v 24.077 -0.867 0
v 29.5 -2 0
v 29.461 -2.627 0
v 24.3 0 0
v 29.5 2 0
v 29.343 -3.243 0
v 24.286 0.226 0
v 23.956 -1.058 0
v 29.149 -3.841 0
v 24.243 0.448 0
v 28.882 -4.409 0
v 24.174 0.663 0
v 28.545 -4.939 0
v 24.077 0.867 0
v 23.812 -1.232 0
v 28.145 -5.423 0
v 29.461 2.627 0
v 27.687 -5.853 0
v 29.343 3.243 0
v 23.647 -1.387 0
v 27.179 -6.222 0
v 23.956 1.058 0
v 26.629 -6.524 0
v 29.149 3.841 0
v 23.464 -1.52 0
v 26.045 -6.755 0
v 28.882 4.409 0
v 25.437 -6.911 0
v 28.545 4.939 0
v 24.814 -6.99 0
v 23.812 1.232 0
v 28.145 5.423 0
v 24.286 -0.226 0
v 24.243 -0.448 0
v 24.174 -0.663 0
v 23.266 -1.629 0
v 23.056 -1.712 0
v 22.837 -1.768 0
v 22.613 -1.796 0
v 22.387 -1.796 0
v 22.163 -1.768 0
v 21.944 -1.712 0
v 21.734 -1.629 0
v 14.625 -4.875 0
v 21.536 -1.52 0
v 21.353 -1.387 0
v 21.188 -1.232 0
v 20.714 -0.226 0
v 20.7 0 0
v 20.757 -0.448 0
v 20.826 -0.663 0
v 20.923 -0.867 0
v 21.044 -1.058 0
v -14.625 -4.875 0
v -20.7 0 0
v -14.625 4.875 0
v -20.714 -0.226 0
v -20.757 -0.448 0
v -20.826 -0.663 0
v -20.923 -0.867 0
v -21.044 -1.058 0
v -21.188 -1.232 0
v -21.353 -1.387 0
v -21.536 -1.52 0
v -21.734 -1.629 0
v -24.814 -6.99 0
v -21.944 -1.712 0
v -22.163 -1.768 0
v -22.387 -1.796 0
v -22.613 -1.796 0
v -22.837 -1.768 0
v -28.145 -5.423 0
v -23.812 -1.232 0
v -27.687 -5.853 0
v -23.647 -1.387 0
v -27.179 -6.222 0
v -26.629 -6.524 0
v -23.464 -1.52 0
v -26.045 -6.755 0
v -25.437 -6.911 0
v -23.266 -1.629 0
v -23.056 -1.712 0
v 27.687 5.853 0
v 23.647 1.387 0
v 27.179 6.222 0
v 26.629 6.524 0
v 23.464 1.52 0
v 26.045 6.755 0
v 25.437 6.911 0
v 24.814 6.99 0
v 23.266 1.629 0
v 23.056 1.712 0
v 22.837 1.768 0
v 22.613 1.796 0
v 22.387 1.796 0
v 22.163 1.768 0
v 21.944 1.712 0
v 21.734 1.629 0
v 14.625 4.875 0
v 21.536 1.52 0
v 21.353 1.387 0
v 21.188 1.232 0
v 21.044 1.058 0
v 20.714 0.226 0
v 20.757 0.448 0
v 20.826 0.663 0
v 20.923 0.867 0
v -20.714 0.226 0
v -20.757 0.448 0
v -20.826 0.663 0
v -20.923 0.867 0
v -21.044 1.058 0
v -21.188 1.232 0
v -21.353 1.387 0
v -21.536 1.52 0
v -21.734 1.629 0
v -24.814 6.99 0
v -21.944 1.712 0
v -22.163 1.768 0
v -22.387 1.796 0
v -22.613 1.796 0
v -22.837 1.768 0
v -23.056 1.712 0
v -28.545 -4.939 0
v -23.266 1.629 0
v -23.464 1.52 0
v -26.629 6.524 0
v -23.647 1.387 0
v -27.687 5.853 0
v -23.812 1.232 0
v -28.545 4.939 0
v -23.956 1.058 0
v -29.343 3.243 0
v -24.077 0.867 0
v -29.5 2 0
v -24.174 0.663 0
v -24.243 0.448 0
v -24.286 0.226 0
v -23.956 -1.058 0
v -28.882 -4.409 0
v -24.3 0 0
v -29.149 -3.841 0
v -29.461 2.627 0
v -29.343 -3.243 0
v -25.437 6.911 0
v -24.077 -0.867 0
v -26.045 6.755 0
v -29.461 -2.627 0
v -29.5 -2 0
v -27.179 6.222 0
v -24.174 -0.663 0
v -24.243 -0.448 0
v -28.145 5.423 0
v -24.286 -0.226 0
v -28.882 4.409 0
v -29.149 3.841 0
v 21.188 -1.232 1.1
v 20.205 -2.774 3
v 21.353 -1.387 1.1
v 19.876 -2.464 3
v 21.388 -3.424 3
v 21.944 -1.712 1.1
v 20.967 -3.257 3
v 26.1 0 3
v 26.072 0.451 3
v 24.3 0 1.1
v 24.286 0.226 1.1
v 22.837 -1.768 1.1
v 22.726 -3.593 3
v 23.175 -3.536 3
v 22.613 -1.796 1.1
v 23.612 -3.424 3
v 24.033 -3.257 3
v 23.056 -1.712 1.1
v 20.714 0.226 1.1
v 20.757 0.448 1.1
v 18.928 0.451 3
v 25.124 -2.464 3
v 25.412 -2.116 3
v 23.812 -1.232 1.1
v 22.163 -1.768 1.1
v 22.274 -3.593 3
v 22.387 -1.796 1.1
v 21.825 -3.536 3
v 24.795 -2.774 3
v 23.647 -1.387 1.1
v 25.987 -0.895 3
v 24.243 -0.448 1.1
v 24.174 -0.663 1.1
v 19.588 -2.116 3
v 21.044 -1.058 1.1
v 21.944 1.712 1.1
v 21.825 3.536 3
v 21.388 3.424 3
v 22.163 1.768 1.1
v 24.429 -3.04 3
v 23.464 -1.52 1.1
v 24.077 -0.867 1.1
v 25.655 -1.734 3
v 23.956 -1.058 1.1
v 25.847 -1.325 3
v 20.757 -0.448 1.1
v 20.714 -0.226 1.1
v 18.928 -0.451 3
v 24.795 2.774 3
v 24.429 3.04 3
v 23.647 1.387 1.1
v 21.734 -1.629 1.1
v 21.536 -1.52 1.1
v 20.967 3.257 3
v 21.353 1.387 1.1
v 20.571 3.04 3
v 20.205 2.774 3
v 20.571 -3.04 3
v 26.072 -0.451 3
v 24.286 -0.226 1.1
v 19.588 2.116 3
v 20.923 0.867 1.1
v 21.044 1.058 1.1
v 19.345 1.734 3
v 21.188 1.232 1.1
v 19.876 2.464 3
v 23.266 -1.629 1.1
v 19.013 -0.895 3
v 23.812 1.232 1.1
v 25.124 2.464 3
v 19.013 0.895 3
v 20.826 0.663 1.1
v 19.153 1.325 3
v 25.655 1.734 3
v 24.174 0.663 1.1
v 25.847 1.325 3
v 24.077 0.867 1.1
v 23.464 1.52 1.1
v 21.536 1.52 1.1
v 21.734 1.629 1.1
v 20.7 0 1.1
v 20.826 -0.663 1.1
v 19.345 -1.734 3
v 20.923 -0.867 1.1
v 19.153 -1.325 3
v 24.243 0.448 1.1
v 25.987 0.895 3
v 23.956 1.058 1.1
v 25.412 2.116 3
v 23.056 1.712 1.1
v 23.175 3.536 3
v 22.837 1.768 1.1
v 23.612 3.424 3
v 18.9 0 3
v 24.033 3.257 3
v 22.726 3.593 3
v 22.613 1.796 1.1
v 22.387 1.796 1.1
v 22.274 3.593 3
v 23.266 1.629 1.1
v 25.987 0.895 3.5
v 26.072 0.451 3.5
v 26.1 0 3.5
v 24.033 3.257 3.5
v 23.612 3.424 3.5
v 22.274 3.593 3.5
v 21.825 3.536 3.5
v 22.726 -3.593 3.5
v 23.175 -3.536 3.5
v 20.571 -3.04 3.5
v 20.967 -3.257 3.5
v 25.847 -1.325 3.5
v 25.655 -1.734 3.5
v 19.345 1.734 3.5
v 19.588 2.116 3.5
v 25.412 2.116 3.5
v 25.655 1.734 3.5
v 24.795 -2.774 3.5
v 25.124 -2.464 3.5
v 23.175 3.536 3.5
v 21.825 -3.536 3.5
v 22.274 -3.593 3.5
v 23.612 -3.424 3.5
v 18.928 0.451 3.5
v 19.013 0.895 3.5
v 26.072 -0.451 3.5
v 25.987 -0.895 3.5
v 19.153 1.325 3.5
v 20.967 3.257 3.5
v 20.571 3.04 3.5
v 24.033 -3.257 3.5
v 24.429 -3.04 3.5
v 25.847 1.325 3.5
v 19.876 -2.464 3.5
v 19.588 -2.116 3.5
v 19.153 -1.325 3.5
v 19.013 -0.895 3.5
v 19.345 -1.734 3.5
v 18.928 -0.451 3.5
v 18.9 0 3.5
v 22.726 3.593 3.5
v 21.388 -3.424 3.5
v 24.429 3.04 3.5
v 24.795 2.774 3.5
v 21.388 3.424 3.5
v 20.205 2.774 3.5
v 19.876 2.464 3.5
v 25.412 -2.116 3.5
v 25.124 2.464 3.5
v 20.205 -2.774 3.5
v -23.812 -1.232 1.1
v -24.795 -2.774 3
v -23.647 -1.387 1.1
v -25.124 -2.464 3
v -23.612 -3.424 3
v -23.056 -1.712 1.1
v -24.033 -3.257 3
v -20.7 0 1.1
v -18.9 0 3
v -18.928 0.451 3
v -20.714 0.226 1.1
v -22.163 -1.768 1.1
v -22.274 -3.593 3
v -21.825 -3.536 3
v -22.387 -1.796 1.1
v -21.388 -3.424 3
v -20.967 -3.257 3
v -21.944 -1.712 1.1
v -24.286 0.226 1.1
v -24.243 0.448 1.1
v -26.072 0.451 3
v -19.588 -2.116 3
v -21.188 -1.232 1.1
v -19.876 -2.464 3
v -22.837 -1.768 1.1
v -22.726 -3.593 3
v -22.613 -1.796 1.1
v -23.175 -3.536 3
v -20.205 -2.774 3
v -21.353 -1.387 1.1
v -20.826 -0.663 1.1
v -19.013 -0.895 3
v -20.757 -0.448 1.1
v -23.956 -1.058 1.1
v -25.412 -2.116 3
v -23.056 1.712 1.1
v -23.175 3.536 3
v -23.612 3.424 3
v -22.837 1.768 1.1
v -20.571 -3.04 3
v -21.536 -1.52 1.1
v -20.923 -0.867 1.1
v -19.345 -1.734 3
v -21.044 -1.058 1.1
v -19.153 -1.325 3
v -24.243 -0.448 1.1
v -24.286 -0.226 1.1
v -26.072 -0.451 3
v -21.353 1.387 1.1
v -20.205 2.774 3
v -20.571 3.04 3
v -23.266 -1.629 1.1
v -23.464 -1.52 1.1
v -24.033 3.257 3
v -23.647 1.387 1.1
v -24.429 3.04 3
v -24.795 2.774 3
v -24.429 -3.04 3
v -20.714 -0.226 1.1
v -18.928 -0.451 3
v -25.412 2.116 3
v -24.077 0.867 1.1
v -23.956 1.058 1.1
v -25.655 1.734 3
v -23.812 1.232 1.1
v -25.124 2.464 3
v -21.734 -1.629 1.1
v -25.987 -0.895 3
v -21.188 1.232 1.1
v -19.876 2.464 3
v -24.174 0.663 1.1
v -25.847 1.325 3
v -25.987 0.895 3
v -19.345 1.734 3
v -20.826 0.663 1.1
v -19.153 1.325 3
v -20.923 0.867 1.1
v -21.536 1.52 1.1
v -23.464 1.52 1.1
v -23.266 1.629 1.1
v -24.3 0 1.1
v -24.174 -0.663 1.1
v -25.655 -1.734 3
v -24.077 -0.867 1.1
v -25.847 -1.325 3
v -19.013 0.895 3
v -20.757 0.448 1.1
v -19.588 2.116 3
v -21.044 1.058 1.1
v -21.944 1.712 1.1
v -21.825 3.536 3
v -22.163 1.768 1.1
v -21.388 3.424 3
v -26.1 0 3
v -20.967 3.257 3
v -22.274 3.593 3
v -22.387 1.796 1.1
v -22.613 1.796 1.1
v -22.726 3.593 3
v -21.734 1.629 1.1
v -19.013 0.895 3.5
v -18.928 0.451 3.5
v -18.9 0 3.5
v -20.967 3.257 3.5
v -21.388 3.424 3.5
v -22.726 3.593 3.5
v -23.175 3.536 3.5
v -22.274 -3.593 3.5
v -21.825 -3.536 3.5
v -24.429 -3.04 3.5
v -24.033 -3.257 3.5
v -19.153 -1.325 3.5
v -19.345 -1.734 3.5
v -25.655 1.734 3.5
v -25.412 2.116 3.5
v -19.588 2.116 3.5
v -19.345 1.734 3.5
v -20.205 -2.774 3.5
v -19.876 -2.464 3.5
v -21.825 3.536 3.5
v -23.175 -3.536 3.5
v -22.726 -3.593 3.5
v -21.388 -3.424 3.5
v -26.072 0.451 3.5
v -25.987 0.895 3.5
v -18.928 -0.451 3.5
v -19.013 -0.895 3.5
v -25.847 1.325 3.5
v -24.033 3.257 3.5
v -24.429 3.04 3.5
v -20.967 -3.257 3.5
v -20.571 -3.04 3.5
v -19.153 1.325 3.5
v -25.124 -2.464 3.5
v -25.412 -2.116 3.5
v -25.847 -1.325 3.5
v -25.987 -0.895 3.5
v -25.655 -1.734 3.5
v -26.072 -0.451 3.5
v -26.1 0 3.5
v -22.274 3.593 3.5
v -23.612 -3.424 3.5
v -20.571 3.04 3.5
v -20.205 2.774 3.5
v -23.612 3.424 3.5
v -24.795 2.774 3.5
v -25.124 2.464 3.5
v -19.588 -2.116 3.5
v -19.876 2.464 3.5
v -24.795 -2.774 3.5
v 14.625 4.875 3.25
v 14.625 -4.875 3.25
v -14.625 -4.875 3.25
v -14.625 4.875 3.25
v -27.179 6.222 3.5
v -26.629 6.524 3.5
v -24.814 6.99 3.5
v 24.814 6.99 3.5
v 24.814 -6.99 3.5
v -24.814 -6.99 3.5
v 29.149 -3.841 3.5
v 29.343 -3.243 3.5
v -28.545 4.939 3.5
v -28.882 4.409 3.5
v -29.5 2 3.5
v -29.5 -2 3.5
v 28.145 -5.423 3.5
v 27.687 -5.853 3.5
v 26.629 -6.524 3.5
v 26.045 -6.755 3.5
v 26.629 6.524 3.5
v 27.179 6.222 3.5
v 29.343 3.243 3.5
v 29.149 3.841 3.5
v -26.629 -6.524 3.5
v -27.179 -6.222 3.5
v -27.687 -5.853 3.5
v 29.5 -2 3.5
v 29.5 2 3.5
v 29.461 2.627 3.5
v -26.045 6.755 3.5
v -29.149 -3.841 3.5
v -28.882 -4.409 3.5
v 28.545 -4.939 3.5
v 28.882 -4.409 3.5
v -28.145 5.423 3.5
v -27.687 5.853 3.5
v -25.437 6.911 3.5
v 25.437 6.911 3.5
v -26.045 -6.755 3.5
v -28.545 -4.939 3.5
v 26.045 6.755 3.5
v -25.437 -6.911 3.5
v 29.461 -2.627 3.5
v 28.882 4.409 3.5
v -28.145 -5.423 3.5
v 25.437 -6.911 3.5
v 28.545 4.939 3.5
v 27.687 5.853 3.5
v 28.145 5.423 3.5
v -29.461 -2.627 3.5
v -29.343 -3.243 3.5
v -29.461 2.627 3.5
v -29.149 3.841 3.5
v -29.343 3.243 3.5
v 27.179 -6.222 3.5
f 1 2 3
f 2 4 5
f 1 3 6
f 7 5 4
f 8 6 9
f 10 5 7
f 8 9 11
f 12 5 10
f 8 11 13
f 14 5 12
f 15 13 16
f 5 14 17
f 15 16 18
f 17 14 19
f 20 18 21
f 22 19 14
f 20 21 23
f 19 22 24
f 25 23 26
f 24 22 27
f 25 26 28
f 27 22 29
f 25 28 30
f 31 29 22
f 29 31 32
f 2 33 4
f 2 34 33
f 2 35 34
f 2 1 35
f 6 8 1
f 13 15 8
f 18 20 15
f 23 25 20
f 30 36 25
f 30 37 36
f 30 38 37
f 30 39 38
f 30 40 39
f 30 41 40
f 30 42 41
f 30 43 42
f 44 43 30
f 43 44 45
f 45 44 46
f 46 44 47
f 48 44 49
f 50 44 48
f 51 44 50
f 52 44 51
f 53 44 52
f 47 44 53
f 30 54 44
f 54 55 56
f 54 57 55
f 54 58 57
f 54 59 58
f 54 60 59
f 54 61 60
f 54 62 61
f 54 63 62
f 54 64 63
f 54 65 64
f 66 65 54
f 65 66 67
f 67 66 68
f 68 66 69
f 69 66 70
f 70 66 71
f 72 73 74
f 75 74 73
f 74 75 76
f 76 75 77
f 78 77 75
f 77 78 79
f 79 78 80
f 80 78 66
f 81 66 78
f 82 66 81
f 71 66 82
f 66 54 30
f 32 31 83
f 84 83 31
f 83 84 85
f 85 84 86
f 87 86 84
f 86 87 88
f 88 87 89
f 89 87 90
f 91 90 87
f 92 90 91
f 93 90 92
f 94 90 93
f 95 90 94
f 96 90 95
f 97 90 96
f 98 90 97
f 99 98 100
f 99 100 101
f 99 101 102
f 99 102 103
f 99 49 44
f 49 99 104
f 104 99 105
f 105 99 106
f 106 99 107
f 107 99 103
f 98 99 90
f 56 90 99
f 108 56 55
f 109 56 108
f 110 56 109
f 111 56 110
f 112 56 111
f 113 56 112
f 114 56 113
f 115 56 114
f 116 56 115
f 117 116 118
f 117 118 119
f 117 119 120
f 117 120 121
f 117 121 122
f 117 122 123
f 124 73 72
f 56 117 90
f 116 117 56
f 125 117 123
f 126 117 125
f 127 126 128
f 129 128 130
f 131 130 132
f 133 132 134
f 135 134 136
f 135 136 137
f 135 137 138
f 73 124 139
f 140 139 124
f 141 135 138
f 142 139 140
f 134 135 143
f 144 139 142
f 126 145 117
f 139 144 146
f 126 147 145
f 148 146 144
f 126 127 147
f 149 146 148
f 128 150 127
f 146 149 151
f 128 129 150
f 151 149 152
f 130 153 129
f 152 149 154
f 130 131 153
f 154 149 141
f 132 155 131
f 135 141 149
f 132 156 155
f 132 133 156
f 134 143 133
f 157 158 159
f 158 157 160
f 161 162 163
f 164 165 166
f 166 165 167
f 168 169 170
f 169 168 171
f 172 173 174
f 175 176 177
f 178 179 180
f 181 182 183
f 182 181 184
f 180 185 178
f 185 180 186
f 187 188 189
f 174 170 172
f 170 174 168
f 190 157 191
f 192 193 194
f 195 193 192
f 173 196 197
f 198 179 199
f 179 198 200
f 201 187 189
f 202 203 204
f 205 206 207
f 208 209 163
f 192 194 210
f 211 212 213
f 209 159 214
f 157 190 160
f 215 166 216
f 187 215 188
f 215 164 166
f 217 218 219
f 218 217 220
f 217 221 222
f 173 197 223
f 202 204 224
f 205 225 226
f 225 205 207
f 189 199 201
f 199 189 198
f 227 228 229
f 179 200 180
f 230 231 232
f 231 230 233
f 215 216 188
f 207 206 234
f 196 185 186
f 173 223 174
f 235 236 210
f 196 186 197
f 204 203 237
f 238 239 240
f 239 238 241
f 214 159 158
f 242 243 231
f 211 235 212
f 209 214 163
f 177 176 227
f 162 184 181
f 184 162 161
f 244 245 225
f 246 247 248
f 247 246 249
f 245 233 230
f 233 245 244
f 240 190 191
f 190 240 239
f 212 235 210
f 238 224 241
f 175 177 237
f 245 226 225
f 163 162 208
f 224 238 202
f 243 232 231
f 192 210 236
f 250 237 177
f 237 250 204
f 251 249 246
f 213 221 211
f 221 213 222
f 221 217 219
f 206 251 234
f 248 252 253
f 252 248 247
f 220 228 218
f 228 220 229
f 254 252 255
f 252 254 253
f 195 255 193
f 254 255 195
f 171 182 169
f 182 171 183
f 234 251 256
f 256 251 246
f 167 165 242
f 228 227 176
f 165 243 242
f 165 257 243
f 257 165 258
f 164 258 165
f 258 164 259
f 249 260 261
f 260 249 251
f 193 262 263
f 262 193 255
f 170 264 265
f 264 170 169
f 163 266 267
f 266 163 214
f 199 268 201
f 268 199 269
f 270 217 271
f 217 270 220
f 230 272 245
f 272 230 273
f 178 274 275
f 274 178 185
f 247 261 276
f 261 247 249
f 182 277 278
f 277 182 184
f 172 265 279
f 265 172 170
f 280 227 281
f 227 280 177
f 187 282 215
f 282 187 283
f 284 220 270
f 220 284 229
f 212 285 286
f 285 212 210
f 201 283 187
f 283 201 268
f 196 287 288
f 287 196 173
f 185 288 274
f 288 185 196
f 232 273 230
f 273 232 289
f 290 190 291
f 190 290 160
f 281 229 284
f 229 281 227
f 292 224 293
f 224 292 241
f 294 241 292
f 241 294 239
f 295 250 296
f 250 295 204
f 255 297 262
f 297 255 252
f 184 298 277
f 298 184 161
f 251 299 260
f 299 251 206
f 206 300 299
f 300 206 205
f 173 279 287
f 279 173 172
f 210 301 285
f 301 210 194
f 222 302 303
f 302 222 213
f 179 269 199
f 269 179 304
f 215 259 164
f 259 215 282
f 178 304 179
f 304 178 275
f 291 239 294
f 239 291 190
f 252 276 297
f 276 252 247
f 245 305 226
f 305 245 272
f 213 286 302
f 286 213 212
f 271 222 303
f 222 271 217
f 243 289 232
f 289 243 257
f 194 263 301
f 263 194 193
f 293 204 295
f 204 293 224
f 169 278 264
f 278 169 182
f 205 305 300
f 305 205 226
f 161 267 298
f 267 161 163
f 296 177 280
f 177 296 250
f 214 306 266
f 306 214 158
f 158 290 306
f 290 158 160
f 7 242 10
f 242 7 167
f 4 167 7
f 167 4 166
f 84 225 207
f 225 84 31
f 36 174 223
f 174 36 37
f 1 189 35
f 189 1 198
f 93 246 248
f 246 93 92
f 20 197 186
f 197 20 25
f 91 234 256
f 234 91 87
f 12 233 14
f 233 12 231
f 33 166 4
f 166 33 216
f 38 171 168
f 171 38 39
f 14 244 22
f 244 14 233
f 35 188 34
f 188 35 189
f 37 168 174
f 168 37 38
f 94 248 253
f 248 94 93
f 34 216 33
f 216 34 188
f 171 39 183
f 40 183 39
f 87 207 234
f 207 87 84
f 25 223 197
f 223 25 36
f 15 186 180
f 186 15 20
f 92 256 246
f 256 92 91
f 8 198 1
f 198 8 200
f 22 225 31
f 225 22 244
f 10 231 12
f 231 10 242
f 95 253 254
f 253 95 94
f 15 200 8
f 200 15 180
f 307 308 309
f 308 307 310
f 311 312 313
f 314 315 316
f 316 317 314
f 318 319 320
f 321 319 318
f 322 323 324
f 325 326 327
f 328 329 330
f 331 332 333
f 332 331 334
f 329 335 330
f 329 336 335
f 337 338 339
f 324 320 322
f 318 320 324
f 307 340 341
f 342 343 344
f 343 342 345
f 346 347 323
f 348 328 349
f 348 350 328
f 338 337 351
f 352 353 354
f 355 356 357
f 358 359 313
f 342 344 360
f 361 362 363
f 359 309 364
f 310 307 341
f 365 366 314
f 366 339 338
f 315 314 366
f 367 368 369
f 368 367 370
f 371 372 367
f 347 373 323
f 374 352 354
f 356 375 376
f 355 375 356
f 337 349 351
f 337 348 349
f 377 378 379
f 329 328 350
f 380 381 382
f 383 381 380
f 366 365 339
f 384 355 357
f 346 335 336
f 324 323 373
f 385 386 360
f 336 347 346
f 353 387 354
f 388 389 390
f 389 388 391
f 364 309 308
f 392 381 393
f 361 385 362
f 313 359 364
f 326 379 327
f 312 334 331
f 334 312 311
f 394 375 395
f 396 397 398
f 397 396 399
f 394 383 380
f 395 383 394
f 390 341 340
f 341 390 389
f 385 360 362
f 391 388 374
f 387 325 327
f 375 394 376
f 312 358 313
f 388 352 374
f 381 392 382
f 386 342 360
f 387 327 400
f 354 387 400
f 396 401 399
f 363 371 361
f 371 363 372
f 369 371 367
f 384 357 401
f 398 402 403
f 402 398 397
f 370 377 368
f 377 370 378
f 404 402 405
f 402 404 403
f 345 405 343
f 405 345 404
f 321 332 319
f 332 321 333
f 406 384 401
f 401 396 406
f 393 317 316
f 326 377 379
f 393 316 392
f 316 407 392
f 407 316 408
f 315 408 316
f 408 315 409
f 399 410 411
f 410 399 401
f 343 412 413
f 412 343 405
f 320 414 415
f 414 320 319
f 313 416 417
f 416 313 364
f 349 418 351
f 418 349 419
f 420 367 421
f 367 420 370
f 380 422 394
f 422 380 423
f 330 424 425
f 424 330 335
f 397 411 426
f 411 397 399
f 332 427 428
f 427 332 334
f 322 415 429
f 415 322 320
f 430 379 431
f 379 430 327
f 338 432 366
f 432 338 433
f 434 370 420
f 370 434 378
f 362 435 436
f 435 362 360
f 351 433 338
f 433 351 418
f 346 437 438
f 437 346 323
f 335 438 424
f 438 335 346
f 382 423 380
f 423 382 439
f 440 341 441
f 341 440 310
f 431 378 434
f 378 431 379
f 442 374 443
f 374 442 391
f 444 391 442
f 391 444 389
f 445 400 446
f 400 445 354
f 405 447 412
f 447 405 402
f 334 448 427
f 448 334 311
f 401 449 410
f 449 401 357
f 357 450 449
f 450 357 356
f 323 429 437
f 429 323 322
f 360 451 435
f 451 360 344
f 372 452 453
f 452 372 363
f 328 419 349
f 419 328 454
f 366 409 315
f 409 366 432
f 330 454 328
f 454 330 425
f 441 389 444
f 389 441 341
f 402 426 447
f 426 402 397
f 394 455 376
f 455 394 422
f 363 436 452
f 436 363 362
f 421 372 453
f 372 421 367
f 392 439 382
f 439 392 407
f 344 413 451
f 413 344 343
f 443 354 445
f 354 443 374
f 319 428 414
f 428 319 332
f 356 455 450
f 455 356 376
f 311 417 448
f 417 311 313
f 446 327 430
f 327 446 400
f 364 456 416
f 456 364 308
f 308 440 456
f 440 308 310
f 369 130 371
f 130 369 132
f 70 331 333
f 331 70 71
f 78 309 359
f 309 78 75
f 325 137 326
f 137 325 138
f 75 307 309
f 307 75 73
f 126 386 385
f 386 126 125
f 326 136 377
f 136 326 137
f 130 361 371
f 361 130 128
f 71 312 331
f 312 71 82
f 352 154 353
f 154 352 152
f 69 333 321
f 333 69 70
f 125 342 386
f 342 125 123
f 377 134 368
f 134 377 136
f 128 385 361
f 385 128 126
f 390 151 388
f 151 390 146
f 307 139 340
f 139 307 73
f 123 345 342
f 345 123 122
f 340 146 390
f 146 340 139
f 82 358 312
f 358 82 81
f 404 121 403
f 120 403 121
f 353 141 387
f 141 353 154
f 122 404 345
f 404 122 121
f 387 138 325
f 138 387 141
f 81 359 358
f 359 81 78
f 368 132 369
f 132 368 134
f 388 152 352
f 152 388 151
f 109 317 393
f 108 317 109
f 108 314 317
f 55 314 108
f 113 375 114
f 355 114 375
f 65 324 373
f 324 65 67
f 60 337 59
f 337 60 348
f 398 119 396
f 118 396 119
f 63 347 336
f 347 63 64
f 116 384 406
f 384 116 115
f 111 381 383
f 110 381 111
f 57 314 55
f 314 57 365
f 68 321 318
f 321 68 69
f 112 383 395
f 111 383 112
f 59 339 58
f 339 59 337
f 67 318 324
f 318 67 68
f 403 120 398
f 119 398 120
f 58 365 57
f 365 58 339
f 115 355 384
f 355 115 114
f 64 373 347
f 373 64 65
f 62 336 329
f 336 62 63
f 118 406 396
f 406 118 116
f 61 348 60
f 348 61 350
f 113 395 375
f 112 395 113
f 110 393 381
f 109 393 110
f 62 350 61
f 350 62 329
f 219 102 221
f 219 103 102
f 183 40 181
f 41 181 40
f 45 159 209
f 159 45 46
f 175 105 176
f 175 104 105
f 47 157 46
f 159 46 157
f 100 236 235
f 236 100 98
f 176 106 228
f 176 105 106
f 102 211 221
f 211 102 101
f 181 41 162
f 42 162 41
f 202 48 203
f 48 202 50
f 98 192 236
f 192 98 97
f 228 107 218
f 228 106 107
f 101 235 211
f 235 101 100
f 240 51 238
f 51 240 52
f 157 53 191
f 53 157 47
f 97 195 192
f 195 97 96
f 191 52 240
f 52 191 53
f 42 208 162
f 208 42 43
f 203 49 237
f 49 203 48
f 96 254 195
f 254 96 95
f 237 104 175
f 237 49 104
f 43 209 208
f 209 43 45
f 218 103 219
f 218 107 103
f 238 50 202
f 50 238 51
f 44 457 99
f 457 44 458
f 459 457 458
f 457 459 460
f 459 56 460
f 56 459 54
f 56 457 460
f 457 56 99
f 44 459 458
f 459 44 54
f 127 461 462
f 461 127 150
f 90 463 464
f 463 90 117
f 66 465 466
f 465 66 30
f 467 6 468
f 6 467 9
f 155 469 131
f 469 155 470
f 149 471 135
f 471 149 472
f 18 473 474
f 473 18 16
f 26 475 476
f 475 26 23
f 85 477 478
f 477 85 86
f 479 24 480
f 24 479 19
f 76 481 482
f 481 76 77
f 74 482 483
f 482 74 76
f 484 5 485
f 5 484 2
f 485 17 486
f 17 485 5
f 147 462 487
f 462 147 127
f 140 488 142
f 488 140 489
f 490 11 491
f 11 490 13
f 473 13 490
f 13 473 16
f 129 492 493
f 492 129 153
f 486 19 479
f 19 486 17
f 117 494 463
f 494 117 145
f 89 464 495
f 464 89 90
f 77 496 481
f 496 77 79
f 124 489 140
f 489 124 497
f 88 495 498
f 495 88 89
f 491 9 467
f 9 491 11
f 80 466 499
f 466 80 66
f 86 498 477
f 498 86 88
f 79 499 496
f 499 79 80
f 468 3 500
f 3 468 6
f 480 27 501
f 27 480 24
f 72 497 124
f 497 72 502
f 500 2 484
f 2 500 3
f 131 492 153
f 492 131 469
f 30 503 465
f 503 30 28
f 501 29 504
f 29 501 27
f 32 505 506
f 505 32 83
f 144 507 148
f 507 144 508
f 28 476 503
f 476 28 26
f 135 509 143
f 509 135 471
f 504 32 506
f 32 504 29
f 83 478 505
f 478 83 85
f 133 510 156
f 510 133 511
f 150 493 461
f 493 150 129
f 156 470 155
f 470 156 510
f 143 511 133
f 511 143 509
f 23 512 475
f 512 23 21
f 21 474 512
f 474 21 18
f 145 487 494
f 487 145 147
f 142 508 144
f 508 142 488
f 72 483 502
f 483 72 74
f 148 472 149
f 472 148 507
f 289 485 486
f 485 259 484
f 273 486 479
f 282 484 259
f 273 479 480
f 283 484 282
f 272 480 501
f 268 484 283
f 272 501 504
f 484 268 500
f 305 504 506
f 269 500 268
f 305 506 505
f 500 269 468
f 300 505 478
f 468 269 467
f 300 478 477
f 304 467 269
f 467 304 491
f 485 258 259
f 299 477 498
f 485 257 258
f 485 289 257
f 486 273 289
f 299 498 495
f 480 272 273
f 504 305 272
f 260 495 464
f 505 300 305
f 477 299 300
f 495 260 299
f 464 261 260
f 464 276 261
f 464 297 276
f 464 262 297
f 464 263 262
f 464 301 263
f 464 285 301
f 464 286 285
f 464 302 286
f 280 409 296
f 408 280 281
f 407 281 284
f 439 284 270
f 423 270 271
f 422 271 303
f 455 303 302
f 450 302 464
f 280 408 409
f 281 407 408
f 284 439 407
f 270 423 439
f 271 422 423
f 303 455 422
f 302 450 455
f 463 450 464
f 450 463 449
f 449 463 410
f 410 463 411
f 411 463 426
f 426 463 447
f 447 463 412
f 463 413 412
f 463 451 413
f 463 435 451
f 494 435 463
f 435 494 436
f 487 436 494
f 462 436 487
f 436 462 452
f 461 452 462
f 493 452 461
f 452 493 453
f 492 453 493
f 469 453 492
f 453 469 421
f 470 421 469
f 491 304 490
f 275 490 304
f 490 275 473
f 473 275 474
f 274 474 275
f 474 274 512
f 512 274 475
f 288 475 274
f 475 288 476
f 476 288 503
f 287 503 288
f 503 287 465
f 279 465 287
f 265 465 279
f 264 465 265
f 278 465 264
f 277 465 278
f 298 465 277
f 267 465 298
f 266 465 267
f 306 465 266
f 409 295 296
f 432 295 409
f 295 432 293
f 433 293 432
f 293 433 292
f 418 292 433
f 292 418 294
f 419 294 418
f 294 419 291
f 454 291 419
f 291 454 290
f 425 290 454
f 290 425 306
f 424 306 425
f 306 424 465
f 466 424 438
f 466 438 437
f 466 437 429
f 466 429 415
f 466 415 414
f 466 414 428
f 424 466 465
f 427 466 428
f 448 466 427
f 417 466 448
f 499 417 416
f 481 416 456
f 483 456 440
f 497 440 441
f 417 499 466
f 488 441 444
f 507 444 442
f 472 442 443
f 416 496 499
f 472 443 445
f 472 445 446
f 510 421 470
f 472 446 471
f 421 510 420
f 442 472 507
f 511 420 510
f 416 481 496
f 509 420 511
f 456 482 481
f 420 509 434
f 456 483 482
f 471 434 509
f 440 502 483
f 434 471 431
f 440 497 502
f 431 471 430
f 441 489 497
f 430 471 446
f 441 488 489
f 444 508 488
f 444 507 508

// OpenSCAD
$fn = 50;


difference() {
	union() {
		hull() {
			translate(v = [-24.5000000000, 2.0000000000, 0]) {
				cylinder(h = 3.5000000000, r = 5);
			}
			translate(v = [24.5000000000, 2.0000000000, 0]) {
				cylinder(h = 3.5000000000, r = 5);
			}
			translate(v = [-24.5000000000, -2.0000000000, 0]) {
				cylinder(h = 3.5000000000, r = 5);
			}
			translate(v = [24.5000000000, -2.0000000000, 0]) {
				cylinder(h = 3.5000000000, r = 5);
			}
		}
	}
	union() {
		translate(v = [22.5000000000, 0, 3.0000000000]) {
			rotate(a = [0, 0, 0]) {
				difference() {
					union() {
						translate(v = [0, 0, -3.0000000000]) {
							cylinder(h = 3.0000000000, r = 1.5000000000);
						}
						translate(v = [0, 0, -1.9000000000]) {
							cylinder(h = 1.9000000000, r1 = 1.8000000000, r2 = 3.6000000000);
						}
						cylinder(h = 250, r = 3.6000000000);
						translate(v = [0, 0, -3.0000000000]) {
							cylinder(h = 3.0000000000, r = 1.8000000000);
						}
						translate(v = [0, 0, -3.0000000000]) {
							cylinder(h = 3.0000000000, r = 1.5000000000);
						}
					}
					union();
				}
			}
		}
		translate(v = [-22.5000000000, 0, 3.0000000000]) {
			rotate(a = [0, 0, 0]) {
				difference() {
					union() {
						translate(v = [0, 0, -3.0000000000]) {
							cylinder(h = 3.0000000000, r = 1.5000000000);
						}
						translate(v = [0, 0, -1.9000000000]) {
							cylinder(h = 1.9000000000, r1 = 1.8000000000, r2 = 3.6000000000);
						}
						cylinder(h = 250, r = 3.6000000000);
						translate(v = [0, 0, -3.0000000000]) {
							cylinder(h = 3.0000000000, r = 1.8000000000);
						}
						translate(v = [0, 0, -3.0000000000]) {
							cylinder(h = 3.0000000000, r = 1.5000000000);
						}
					}
					union();
				}
			}
		}
		translate(v = [-22.5000000000, 0.0000000000, 0]) {
			cylinder(h = 3.5000000000, r = 1.8000000000);
		}
		translate(v = [22.5000000000, 0.0000000000, 0]) {
			cylinder(h = 3.5000000000, r = 1.8000000000);
		}
		translate(v = [-22.5000000000, 0.0000000000, 0]) {
			cylinder(h = 3.5000000000, r = 1.8000000000);
		}
		translate(v = [22.5000000000, 0.0000000000, 0]) {
			cylinder(h = 3.5000000000, r = 1.8000000000);
		}
		translate(v = [-22.5000000000, 0.0000000000, 0]) {
			cylinder(h = 3.5000000000, r = 1.8000000000);
		}
		translate(v = [22.5000000000, 0.0000000000, 0]) {
			cylinder(h = 3.5000000000, r = 1.8000000000);
		}
		translate(v = [-22.5000000000, 0.0000000000, 0]) {
			cylinder(h = 3.5000000000, r = 1.8000000000);
		}
		translate(v = [22.5000000000, 0.0000000000, 0]) {
			cylinder(h = 3.5000000000, r = 1.8000000000);
		}
		#translate(v = [-14.6250000000, -4.8750000000, 0]) {
			cube(size = [29.2500000000, 9.7500000000, 3.2500000000]);
		}
	}
}
